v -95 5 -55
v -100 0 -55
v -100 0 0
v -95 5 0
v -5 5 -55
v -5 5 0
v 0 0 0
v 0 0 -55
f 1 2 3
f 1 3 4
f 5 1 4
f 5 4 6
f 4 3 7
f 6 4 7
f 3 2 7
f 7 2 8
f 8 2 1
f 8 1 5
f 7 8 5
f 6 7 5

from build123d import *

# Parameters (mm, degrees)
SKETCH2_W           = 100
SKETCH2_H           = 55
BOSS_EXTRUDE1_DEPTH = 5
CUT_EXTRUDE2_REACH  = 116.237
CUT_EXTRUDE3_DEPTH  = 66


with BuildPart() as part:
    # Sketch2 → Boss-Extrude1 (new body)
    with BuildSketch(Plane(origin=(0, 0, 0), x_dir=(1, 0, 0), z_dir=(0, 1, 0))):
        with Locations((-50, 27.5)):
            Rectangle(SKETCH2_W, SKETCH2_H)
    extrude(amount=BOSS_EXTRUDE1_DEPTH)

    # Sketch5 → Cut-Extrude2 (cut, up to next)
    with BuildSketch(Plane.XY, mode=Mode.PRIVATE) as cut_extrude2_sk1:
        Polygon((0, 0), (-5, 5), (0, 5), align=None)
    cut_extrude2_tool1 = extrude(cut_extrude2_sk1.sketch, amount=-CUT_EXTRUDE2_REACH, mode=Mode.PRIVATE) & part.part
    add(cut_extrude2_tool1.solids().sort_by_distance((-1.666667, 3.333333, 0))[0], mode=Mode.SUBTRACT)

    # Sketch3 → Cut-Extrude3 (cut)
    with BuildSketch(Plane.XY):
        Polygon((-100, 0), (-95, 5), (-100, 5), align=None)
    extrude(amount=-CUT_EXTRUDE3_DEPTH, mode=Mode.SUBTRACT)


solid = part.part
